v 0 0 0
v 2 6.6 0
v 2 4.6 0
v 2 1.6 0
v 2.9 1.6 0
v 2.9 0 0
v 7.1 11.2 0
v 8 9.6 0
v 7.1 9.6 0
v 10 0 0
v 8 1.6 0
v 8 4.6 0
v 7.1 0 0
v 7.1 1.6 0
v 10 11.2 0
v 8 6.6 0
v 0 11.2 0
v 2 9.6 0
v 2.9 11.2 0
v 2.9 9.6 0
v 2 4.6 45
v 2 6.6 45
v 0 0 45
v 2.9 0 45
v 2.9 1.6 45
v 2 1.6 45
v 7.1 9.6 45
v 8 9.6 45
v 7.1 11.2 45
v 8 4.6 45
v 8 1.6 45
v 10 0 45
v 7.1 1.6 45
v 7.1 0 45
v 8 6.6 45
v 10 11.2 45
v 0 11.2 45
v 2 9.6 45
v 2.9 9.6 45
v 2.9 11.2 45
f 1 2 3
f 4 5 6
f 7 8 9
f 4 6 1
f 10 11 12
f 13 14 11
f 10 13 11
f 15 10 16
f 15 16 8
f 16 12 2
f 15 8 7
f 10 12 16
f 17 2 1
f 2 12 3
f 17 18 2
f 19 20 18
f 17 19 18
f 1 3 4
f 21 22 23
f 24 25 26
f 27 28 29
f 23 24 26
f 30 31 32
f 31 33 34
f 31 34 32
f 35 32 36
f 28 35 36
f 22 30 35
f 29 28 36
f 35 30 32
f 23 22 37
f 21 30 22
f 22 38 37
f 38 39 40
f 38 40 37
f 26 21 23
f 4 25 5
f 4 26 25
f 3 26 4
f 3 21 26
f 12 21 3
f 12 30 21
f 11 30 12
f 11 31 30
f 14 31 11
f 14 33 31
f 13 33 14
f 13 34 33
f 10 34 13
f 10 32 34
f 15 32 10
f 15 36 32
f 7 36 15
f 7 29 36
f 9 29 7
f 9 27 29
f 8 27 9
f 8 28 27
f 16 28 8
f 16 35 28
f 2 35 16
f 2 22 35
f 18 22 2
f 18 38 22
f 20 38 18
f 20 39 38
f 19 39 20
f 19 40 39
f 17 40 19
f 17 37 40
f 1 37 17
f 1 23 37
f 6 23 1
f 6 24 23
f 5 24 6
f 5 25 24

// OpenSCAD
d = 25;
ed = 6;
id = 4.2;
eh = 3;
ih = 1.6;
t = 2;

cw = ed + t*2;
ch = 10;
tol = 0.1;

module cutter() {

    union() {

        translate([-tol,-ed/2, ih])
        cube([d + tol, ed, eh]);

        translate([-tol,-id/2,-tol])
        cube([d + tol, id, ih + tol]);
        
    }
        
}

/*
difference() {
    translate([0,-cw/2,0])
        cube([d * 3, cw, (ih + eh) * 2 + t]);
    
    cutter();
    translate([d*2+tol,0,0])
        cutter();
}*/

module shape() {

    //linear_extrude(ch)
    polygon([
        [0,0],
        [cw/2 - id/2, 0],
        [cw/2 - id/2, ih],
        [cw/2 - ed/2, ih],
        [cw/2 - ed/2, ih + eh],
        [cw/2 + ed/2, ih + eh],
        [cw/2 + ed/2, ih],
        [cw/2 + id/2, ih],
        [cw/2 + id/2, 0],
        [cw, 0],
        [cw, (ih + eh)*2 + t],
        [cw/2 + id/2, (ih + eh)*2 + t],
        [cw/2 + id/2, ih + eh*2 + t],
        [cw/2 + ed/2, ih + eh*2 + t],
        [cw/2 + ed/2, ih + eh + t],
        [cw/2 - ed/2, ih + eh + t],
        [cw/2 - ed/2, ih + eh*2 + t],
        [cw/2 - id/2, ih + eh*2 + t],
        [cw/2 - id/2, ih*2 + eh*2 + t],
        [0, ih*2 + eh*2 + t],
    ]);
}
linear_extrude(d + ch*2)
shape();


    

/*
hull($fn = 64) {
    cylinder(d = 25, h = 15);
    
    translate([50,0,0])
    cylinder(d = 25, h = 15);
}*/
